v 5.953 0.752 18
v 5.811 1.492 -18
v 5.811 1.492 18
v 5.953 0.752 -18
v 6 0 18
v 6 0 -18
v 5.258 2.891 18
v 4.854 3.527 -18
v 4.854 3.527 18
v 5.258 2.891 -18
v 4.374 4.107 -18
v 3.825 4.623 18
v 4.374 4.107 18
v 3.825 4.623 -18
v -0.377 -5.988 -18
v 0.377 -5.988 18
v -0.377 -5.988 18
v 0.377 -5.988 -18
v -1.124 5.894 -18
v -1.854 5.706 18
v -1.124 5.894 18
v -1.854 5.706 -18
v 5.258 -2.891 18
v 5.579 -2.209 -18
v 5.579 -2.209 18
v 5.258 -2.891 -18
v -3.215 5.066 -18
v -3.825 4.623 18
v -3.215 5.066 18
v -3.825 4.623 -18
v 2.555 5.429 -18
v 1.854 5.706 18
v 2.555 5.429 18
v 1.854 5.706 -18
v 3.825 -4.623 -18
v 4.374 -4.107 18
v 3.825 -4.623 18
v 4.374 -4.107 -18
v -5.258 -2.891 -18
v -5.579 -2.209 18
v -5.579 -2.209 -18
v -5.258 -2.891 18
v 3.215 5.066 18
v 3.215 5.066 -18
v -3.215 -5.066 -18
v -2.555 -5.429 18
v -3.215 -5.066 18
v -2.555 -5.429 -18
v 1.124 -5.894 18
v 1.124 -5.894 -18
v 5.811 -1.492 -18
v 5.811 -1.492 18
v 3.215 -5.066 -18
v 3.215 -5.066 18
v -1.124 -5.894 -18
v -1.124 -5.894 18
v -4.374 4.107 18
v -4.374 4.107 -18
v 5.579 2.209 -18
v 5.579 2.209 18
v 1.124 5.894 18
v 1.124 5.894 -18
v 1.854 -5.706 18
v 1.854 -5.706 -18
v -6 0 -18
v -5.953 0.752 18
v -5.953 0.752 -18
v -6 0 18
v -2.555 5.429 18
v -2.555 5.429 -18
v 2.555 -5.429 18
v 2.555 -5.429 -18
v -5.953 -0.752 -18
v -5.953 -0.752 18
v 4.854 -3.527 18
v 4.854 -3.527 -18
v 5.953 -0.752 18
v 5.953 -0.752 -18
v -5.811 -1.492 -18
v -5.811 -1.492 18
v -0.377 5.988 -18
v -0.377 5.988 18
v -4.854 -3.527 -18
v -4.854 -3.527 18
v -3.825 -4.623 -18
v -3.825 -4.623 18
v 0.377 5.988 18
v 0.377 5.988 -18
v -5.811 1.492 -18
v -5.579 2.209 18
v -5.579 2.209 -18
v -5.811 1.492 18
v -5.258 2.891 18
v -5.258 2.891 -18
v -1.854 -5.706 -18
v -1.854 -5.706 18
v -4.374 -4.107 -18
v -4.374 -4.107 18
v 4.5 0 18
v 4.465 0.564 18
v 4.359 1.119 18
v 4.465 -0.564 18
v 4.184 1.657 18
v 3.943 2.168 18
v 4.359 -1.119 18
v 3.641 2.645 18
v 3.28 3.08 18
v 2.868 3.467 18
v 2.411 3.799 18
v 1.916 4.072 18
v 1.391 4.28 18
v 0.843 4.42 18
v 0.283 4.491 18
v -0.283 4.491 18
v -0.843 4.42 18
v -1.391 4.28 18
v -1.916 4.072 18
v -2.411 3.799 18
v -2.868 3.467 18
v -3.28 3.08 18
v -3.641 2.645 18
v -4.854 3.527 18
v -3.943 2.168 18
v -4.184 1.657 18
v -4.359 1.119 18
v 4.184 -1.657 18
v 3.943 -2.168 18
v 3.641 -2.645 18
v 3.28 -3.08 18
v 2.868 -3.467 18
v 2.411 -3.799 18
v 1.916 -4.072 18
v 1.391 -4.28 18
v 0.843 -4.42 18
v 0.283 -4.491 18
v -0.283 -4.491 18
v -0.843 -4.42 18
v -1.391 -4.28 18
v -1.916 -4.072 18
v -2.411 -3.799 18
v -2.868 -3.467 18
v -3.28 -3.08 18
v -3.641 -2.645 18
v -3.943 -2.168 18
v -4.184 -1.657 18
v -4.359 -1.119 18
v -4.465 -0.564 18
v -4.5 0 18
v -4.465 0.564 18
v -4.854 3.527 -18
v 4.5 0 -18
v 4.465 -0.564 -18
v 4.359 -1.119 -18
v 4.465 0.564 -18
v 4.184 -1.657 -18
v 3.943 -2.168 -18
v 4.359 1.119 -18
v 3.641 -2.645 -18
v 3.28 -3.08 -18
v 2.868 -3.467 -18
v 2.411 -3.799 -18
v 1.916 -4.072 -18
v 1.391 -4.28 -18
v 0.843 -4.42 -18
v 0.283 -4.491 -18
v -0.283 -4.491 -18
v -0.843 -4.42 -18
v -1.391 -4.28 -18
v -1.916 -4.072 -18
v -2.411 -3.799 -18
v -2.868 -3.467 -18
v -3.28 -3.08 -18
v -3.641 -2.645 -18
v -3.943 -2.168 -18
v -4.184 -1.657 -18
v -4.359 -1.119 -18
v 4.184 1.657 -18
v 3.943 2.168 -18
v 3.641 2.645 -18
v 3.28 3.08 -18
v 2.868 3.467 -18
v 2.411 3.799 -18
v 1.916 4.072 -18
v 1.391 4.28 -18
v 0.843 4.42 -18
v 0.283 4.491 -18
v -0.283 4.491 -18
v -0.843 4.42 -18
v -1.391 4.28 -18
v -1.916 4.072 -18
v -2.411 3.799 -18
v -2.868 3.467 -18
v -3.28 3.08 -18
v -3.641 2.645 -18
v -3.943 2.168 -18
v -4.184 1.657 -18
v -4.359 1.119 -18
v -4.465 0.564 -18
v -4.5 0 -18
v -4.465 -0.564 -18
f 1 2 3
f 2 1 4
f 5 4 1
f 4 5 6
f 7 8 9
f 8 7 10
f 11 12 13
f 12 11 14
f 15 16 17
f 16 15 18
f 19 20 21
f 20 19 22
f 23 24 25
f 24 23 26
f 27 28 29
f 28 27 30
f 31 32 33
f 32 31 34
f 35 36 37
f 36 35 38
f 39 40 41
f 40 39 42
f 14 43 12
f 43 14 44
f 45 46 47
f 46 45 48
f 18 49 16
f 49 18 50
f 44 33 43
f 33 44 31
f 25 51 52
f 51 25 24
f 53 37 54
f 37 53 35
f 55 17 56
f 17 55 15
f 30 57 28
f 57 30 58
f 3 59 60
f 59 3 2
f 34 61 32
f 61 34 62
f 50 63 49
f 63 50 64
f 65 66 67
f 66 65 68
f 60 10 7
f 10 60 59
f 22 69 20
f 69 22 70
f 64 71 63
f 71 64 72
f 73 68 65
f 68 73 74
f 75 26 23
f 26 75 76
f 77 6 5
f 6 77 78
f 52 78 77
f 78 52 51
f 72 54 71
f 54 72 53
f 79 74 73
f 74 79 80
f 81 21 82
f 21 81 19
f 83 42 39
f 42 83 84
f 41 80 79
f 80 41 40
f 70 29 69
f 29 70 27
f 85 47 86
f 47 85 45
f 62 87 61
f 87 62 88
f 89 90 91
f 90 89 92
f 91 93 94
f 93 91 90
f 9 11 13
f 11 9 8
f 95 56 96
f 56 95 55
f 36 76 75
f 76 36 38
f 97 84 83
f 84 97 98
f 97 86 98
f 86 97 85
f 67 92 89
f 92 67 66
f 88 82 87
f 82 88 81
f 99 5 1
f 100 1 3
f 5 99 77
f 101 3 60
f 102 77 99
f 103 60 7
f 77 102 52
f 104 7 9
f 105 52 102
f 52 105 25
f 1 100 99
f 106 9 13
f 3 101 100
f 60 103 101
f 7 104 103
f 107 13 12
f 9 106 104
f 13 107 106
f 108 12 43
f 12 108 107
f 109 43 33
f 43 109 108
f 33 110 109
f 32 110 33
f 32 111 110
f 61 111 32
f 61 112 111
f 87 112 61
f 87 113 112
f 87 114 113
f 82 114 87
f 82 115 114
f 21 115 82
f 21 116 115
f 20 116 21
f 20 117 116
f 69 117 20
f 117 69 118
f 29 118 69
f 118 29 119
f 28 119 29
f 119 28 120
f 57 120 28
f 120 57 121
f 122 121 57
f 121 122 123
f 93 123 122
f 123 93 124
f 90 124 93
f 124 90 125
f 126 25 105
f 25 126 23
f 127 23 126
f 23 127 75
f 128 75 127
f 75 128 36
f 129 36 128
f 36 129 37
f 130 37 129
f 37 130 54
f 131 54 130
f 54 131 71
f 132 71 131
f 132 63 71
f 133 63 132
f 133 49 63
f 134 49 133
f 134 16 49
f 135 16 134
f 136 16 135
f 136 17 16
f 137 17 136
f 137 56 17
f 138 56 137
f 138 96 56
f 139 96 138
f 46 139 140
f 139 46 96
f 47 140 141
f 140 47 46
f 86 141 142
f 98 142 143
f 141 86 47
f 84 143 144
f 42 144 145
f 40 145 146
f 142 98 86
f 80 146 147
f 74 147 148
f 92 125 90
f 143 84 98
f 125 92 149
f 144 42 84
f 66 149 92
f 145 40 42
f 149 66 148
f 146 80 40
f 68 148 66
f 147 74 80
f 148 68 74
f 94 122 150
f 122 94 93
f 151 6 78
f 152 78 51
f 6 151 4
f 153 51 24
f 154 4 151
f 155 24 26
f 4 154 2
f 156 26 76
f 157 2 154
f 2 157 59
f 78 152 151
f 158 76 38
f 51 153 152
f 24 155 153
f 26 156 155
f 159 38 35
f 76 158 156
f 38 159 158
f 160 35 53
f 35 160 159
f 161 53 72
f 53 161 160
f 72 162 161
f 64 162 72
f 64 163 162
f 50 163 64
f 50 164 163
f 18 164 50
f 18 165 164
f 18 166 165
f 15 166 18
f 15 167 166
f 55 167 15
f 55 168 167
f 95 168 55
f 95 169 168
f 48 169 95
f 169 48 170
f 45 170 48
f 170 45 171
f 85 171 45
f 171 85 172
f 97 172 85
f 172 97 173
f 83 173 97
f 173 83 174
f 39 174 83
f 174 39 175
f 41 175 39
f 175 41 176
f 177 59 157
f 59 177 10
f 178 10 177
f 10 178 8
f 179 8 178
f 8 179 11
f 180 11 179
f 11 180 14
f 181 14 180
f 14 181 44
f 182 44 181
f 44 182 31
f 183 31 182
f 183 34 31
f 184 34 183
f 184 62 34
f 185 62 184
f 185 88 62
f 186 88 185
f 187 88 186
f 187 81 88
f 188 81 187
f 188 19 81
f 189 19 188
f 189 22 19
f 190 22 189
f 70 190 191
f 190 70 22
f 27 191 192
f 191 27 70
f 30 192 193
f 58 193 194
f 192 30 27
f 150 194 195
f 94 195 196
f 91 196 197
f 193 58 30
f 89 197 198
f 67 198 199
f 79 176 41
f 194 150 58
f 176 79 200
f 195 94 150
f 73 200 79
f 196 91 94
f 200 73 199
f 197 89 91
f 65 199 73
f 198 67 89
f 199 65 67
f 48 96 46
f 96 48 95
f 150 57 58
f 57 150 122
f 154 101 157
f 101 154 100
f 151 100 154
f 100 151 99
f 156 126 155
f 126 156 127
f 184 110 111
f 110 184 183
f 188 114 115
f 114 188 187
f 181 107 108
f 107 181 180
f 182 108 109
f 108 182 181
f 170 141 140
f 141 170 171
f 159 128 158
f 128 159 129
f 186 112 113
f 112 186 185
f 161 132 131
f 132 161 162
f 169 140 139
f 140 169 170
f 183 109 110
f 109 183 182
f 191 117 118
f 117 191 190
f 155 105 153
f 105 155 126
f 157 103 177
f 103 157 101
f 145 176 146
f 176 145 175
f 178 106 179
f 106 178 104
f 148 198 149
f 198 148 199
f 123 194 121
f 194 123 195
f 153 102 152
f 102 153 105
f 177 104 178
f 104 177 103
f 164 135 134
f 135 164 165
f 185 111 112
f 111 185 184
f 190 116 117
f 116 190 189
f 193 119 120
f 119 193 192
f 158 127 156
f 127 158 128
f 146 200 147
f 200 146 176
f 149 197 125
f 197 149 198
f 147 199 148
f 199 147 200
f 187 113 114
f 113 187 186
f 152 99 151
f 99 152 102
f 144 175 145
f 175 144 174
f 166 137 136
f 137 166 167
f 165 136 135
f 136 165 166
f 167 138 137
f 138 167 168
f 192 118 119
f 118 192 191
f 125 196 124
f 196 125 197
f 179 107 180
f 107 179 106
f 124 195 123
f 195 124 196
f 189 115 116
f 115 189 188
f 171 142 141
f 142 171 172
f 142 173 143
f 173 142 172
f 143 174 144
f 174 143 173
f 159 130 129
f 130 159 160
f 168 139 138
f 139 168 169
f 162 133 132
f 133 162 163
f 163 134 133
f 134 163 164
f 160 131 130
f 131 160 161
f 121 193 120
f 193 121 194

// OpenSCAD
$fn = 50;


difference() {
	union() {
		translate(v = [0, 0, -18.0000000000]) {
			cylinder(h = 36, r = 6.0000000000);
		}
	}
	union() {
		translate(v = [0, 0, -100.0000000000]) {
			cylinder(h = 200, r = 4.5000000000);
		}
	}
}
